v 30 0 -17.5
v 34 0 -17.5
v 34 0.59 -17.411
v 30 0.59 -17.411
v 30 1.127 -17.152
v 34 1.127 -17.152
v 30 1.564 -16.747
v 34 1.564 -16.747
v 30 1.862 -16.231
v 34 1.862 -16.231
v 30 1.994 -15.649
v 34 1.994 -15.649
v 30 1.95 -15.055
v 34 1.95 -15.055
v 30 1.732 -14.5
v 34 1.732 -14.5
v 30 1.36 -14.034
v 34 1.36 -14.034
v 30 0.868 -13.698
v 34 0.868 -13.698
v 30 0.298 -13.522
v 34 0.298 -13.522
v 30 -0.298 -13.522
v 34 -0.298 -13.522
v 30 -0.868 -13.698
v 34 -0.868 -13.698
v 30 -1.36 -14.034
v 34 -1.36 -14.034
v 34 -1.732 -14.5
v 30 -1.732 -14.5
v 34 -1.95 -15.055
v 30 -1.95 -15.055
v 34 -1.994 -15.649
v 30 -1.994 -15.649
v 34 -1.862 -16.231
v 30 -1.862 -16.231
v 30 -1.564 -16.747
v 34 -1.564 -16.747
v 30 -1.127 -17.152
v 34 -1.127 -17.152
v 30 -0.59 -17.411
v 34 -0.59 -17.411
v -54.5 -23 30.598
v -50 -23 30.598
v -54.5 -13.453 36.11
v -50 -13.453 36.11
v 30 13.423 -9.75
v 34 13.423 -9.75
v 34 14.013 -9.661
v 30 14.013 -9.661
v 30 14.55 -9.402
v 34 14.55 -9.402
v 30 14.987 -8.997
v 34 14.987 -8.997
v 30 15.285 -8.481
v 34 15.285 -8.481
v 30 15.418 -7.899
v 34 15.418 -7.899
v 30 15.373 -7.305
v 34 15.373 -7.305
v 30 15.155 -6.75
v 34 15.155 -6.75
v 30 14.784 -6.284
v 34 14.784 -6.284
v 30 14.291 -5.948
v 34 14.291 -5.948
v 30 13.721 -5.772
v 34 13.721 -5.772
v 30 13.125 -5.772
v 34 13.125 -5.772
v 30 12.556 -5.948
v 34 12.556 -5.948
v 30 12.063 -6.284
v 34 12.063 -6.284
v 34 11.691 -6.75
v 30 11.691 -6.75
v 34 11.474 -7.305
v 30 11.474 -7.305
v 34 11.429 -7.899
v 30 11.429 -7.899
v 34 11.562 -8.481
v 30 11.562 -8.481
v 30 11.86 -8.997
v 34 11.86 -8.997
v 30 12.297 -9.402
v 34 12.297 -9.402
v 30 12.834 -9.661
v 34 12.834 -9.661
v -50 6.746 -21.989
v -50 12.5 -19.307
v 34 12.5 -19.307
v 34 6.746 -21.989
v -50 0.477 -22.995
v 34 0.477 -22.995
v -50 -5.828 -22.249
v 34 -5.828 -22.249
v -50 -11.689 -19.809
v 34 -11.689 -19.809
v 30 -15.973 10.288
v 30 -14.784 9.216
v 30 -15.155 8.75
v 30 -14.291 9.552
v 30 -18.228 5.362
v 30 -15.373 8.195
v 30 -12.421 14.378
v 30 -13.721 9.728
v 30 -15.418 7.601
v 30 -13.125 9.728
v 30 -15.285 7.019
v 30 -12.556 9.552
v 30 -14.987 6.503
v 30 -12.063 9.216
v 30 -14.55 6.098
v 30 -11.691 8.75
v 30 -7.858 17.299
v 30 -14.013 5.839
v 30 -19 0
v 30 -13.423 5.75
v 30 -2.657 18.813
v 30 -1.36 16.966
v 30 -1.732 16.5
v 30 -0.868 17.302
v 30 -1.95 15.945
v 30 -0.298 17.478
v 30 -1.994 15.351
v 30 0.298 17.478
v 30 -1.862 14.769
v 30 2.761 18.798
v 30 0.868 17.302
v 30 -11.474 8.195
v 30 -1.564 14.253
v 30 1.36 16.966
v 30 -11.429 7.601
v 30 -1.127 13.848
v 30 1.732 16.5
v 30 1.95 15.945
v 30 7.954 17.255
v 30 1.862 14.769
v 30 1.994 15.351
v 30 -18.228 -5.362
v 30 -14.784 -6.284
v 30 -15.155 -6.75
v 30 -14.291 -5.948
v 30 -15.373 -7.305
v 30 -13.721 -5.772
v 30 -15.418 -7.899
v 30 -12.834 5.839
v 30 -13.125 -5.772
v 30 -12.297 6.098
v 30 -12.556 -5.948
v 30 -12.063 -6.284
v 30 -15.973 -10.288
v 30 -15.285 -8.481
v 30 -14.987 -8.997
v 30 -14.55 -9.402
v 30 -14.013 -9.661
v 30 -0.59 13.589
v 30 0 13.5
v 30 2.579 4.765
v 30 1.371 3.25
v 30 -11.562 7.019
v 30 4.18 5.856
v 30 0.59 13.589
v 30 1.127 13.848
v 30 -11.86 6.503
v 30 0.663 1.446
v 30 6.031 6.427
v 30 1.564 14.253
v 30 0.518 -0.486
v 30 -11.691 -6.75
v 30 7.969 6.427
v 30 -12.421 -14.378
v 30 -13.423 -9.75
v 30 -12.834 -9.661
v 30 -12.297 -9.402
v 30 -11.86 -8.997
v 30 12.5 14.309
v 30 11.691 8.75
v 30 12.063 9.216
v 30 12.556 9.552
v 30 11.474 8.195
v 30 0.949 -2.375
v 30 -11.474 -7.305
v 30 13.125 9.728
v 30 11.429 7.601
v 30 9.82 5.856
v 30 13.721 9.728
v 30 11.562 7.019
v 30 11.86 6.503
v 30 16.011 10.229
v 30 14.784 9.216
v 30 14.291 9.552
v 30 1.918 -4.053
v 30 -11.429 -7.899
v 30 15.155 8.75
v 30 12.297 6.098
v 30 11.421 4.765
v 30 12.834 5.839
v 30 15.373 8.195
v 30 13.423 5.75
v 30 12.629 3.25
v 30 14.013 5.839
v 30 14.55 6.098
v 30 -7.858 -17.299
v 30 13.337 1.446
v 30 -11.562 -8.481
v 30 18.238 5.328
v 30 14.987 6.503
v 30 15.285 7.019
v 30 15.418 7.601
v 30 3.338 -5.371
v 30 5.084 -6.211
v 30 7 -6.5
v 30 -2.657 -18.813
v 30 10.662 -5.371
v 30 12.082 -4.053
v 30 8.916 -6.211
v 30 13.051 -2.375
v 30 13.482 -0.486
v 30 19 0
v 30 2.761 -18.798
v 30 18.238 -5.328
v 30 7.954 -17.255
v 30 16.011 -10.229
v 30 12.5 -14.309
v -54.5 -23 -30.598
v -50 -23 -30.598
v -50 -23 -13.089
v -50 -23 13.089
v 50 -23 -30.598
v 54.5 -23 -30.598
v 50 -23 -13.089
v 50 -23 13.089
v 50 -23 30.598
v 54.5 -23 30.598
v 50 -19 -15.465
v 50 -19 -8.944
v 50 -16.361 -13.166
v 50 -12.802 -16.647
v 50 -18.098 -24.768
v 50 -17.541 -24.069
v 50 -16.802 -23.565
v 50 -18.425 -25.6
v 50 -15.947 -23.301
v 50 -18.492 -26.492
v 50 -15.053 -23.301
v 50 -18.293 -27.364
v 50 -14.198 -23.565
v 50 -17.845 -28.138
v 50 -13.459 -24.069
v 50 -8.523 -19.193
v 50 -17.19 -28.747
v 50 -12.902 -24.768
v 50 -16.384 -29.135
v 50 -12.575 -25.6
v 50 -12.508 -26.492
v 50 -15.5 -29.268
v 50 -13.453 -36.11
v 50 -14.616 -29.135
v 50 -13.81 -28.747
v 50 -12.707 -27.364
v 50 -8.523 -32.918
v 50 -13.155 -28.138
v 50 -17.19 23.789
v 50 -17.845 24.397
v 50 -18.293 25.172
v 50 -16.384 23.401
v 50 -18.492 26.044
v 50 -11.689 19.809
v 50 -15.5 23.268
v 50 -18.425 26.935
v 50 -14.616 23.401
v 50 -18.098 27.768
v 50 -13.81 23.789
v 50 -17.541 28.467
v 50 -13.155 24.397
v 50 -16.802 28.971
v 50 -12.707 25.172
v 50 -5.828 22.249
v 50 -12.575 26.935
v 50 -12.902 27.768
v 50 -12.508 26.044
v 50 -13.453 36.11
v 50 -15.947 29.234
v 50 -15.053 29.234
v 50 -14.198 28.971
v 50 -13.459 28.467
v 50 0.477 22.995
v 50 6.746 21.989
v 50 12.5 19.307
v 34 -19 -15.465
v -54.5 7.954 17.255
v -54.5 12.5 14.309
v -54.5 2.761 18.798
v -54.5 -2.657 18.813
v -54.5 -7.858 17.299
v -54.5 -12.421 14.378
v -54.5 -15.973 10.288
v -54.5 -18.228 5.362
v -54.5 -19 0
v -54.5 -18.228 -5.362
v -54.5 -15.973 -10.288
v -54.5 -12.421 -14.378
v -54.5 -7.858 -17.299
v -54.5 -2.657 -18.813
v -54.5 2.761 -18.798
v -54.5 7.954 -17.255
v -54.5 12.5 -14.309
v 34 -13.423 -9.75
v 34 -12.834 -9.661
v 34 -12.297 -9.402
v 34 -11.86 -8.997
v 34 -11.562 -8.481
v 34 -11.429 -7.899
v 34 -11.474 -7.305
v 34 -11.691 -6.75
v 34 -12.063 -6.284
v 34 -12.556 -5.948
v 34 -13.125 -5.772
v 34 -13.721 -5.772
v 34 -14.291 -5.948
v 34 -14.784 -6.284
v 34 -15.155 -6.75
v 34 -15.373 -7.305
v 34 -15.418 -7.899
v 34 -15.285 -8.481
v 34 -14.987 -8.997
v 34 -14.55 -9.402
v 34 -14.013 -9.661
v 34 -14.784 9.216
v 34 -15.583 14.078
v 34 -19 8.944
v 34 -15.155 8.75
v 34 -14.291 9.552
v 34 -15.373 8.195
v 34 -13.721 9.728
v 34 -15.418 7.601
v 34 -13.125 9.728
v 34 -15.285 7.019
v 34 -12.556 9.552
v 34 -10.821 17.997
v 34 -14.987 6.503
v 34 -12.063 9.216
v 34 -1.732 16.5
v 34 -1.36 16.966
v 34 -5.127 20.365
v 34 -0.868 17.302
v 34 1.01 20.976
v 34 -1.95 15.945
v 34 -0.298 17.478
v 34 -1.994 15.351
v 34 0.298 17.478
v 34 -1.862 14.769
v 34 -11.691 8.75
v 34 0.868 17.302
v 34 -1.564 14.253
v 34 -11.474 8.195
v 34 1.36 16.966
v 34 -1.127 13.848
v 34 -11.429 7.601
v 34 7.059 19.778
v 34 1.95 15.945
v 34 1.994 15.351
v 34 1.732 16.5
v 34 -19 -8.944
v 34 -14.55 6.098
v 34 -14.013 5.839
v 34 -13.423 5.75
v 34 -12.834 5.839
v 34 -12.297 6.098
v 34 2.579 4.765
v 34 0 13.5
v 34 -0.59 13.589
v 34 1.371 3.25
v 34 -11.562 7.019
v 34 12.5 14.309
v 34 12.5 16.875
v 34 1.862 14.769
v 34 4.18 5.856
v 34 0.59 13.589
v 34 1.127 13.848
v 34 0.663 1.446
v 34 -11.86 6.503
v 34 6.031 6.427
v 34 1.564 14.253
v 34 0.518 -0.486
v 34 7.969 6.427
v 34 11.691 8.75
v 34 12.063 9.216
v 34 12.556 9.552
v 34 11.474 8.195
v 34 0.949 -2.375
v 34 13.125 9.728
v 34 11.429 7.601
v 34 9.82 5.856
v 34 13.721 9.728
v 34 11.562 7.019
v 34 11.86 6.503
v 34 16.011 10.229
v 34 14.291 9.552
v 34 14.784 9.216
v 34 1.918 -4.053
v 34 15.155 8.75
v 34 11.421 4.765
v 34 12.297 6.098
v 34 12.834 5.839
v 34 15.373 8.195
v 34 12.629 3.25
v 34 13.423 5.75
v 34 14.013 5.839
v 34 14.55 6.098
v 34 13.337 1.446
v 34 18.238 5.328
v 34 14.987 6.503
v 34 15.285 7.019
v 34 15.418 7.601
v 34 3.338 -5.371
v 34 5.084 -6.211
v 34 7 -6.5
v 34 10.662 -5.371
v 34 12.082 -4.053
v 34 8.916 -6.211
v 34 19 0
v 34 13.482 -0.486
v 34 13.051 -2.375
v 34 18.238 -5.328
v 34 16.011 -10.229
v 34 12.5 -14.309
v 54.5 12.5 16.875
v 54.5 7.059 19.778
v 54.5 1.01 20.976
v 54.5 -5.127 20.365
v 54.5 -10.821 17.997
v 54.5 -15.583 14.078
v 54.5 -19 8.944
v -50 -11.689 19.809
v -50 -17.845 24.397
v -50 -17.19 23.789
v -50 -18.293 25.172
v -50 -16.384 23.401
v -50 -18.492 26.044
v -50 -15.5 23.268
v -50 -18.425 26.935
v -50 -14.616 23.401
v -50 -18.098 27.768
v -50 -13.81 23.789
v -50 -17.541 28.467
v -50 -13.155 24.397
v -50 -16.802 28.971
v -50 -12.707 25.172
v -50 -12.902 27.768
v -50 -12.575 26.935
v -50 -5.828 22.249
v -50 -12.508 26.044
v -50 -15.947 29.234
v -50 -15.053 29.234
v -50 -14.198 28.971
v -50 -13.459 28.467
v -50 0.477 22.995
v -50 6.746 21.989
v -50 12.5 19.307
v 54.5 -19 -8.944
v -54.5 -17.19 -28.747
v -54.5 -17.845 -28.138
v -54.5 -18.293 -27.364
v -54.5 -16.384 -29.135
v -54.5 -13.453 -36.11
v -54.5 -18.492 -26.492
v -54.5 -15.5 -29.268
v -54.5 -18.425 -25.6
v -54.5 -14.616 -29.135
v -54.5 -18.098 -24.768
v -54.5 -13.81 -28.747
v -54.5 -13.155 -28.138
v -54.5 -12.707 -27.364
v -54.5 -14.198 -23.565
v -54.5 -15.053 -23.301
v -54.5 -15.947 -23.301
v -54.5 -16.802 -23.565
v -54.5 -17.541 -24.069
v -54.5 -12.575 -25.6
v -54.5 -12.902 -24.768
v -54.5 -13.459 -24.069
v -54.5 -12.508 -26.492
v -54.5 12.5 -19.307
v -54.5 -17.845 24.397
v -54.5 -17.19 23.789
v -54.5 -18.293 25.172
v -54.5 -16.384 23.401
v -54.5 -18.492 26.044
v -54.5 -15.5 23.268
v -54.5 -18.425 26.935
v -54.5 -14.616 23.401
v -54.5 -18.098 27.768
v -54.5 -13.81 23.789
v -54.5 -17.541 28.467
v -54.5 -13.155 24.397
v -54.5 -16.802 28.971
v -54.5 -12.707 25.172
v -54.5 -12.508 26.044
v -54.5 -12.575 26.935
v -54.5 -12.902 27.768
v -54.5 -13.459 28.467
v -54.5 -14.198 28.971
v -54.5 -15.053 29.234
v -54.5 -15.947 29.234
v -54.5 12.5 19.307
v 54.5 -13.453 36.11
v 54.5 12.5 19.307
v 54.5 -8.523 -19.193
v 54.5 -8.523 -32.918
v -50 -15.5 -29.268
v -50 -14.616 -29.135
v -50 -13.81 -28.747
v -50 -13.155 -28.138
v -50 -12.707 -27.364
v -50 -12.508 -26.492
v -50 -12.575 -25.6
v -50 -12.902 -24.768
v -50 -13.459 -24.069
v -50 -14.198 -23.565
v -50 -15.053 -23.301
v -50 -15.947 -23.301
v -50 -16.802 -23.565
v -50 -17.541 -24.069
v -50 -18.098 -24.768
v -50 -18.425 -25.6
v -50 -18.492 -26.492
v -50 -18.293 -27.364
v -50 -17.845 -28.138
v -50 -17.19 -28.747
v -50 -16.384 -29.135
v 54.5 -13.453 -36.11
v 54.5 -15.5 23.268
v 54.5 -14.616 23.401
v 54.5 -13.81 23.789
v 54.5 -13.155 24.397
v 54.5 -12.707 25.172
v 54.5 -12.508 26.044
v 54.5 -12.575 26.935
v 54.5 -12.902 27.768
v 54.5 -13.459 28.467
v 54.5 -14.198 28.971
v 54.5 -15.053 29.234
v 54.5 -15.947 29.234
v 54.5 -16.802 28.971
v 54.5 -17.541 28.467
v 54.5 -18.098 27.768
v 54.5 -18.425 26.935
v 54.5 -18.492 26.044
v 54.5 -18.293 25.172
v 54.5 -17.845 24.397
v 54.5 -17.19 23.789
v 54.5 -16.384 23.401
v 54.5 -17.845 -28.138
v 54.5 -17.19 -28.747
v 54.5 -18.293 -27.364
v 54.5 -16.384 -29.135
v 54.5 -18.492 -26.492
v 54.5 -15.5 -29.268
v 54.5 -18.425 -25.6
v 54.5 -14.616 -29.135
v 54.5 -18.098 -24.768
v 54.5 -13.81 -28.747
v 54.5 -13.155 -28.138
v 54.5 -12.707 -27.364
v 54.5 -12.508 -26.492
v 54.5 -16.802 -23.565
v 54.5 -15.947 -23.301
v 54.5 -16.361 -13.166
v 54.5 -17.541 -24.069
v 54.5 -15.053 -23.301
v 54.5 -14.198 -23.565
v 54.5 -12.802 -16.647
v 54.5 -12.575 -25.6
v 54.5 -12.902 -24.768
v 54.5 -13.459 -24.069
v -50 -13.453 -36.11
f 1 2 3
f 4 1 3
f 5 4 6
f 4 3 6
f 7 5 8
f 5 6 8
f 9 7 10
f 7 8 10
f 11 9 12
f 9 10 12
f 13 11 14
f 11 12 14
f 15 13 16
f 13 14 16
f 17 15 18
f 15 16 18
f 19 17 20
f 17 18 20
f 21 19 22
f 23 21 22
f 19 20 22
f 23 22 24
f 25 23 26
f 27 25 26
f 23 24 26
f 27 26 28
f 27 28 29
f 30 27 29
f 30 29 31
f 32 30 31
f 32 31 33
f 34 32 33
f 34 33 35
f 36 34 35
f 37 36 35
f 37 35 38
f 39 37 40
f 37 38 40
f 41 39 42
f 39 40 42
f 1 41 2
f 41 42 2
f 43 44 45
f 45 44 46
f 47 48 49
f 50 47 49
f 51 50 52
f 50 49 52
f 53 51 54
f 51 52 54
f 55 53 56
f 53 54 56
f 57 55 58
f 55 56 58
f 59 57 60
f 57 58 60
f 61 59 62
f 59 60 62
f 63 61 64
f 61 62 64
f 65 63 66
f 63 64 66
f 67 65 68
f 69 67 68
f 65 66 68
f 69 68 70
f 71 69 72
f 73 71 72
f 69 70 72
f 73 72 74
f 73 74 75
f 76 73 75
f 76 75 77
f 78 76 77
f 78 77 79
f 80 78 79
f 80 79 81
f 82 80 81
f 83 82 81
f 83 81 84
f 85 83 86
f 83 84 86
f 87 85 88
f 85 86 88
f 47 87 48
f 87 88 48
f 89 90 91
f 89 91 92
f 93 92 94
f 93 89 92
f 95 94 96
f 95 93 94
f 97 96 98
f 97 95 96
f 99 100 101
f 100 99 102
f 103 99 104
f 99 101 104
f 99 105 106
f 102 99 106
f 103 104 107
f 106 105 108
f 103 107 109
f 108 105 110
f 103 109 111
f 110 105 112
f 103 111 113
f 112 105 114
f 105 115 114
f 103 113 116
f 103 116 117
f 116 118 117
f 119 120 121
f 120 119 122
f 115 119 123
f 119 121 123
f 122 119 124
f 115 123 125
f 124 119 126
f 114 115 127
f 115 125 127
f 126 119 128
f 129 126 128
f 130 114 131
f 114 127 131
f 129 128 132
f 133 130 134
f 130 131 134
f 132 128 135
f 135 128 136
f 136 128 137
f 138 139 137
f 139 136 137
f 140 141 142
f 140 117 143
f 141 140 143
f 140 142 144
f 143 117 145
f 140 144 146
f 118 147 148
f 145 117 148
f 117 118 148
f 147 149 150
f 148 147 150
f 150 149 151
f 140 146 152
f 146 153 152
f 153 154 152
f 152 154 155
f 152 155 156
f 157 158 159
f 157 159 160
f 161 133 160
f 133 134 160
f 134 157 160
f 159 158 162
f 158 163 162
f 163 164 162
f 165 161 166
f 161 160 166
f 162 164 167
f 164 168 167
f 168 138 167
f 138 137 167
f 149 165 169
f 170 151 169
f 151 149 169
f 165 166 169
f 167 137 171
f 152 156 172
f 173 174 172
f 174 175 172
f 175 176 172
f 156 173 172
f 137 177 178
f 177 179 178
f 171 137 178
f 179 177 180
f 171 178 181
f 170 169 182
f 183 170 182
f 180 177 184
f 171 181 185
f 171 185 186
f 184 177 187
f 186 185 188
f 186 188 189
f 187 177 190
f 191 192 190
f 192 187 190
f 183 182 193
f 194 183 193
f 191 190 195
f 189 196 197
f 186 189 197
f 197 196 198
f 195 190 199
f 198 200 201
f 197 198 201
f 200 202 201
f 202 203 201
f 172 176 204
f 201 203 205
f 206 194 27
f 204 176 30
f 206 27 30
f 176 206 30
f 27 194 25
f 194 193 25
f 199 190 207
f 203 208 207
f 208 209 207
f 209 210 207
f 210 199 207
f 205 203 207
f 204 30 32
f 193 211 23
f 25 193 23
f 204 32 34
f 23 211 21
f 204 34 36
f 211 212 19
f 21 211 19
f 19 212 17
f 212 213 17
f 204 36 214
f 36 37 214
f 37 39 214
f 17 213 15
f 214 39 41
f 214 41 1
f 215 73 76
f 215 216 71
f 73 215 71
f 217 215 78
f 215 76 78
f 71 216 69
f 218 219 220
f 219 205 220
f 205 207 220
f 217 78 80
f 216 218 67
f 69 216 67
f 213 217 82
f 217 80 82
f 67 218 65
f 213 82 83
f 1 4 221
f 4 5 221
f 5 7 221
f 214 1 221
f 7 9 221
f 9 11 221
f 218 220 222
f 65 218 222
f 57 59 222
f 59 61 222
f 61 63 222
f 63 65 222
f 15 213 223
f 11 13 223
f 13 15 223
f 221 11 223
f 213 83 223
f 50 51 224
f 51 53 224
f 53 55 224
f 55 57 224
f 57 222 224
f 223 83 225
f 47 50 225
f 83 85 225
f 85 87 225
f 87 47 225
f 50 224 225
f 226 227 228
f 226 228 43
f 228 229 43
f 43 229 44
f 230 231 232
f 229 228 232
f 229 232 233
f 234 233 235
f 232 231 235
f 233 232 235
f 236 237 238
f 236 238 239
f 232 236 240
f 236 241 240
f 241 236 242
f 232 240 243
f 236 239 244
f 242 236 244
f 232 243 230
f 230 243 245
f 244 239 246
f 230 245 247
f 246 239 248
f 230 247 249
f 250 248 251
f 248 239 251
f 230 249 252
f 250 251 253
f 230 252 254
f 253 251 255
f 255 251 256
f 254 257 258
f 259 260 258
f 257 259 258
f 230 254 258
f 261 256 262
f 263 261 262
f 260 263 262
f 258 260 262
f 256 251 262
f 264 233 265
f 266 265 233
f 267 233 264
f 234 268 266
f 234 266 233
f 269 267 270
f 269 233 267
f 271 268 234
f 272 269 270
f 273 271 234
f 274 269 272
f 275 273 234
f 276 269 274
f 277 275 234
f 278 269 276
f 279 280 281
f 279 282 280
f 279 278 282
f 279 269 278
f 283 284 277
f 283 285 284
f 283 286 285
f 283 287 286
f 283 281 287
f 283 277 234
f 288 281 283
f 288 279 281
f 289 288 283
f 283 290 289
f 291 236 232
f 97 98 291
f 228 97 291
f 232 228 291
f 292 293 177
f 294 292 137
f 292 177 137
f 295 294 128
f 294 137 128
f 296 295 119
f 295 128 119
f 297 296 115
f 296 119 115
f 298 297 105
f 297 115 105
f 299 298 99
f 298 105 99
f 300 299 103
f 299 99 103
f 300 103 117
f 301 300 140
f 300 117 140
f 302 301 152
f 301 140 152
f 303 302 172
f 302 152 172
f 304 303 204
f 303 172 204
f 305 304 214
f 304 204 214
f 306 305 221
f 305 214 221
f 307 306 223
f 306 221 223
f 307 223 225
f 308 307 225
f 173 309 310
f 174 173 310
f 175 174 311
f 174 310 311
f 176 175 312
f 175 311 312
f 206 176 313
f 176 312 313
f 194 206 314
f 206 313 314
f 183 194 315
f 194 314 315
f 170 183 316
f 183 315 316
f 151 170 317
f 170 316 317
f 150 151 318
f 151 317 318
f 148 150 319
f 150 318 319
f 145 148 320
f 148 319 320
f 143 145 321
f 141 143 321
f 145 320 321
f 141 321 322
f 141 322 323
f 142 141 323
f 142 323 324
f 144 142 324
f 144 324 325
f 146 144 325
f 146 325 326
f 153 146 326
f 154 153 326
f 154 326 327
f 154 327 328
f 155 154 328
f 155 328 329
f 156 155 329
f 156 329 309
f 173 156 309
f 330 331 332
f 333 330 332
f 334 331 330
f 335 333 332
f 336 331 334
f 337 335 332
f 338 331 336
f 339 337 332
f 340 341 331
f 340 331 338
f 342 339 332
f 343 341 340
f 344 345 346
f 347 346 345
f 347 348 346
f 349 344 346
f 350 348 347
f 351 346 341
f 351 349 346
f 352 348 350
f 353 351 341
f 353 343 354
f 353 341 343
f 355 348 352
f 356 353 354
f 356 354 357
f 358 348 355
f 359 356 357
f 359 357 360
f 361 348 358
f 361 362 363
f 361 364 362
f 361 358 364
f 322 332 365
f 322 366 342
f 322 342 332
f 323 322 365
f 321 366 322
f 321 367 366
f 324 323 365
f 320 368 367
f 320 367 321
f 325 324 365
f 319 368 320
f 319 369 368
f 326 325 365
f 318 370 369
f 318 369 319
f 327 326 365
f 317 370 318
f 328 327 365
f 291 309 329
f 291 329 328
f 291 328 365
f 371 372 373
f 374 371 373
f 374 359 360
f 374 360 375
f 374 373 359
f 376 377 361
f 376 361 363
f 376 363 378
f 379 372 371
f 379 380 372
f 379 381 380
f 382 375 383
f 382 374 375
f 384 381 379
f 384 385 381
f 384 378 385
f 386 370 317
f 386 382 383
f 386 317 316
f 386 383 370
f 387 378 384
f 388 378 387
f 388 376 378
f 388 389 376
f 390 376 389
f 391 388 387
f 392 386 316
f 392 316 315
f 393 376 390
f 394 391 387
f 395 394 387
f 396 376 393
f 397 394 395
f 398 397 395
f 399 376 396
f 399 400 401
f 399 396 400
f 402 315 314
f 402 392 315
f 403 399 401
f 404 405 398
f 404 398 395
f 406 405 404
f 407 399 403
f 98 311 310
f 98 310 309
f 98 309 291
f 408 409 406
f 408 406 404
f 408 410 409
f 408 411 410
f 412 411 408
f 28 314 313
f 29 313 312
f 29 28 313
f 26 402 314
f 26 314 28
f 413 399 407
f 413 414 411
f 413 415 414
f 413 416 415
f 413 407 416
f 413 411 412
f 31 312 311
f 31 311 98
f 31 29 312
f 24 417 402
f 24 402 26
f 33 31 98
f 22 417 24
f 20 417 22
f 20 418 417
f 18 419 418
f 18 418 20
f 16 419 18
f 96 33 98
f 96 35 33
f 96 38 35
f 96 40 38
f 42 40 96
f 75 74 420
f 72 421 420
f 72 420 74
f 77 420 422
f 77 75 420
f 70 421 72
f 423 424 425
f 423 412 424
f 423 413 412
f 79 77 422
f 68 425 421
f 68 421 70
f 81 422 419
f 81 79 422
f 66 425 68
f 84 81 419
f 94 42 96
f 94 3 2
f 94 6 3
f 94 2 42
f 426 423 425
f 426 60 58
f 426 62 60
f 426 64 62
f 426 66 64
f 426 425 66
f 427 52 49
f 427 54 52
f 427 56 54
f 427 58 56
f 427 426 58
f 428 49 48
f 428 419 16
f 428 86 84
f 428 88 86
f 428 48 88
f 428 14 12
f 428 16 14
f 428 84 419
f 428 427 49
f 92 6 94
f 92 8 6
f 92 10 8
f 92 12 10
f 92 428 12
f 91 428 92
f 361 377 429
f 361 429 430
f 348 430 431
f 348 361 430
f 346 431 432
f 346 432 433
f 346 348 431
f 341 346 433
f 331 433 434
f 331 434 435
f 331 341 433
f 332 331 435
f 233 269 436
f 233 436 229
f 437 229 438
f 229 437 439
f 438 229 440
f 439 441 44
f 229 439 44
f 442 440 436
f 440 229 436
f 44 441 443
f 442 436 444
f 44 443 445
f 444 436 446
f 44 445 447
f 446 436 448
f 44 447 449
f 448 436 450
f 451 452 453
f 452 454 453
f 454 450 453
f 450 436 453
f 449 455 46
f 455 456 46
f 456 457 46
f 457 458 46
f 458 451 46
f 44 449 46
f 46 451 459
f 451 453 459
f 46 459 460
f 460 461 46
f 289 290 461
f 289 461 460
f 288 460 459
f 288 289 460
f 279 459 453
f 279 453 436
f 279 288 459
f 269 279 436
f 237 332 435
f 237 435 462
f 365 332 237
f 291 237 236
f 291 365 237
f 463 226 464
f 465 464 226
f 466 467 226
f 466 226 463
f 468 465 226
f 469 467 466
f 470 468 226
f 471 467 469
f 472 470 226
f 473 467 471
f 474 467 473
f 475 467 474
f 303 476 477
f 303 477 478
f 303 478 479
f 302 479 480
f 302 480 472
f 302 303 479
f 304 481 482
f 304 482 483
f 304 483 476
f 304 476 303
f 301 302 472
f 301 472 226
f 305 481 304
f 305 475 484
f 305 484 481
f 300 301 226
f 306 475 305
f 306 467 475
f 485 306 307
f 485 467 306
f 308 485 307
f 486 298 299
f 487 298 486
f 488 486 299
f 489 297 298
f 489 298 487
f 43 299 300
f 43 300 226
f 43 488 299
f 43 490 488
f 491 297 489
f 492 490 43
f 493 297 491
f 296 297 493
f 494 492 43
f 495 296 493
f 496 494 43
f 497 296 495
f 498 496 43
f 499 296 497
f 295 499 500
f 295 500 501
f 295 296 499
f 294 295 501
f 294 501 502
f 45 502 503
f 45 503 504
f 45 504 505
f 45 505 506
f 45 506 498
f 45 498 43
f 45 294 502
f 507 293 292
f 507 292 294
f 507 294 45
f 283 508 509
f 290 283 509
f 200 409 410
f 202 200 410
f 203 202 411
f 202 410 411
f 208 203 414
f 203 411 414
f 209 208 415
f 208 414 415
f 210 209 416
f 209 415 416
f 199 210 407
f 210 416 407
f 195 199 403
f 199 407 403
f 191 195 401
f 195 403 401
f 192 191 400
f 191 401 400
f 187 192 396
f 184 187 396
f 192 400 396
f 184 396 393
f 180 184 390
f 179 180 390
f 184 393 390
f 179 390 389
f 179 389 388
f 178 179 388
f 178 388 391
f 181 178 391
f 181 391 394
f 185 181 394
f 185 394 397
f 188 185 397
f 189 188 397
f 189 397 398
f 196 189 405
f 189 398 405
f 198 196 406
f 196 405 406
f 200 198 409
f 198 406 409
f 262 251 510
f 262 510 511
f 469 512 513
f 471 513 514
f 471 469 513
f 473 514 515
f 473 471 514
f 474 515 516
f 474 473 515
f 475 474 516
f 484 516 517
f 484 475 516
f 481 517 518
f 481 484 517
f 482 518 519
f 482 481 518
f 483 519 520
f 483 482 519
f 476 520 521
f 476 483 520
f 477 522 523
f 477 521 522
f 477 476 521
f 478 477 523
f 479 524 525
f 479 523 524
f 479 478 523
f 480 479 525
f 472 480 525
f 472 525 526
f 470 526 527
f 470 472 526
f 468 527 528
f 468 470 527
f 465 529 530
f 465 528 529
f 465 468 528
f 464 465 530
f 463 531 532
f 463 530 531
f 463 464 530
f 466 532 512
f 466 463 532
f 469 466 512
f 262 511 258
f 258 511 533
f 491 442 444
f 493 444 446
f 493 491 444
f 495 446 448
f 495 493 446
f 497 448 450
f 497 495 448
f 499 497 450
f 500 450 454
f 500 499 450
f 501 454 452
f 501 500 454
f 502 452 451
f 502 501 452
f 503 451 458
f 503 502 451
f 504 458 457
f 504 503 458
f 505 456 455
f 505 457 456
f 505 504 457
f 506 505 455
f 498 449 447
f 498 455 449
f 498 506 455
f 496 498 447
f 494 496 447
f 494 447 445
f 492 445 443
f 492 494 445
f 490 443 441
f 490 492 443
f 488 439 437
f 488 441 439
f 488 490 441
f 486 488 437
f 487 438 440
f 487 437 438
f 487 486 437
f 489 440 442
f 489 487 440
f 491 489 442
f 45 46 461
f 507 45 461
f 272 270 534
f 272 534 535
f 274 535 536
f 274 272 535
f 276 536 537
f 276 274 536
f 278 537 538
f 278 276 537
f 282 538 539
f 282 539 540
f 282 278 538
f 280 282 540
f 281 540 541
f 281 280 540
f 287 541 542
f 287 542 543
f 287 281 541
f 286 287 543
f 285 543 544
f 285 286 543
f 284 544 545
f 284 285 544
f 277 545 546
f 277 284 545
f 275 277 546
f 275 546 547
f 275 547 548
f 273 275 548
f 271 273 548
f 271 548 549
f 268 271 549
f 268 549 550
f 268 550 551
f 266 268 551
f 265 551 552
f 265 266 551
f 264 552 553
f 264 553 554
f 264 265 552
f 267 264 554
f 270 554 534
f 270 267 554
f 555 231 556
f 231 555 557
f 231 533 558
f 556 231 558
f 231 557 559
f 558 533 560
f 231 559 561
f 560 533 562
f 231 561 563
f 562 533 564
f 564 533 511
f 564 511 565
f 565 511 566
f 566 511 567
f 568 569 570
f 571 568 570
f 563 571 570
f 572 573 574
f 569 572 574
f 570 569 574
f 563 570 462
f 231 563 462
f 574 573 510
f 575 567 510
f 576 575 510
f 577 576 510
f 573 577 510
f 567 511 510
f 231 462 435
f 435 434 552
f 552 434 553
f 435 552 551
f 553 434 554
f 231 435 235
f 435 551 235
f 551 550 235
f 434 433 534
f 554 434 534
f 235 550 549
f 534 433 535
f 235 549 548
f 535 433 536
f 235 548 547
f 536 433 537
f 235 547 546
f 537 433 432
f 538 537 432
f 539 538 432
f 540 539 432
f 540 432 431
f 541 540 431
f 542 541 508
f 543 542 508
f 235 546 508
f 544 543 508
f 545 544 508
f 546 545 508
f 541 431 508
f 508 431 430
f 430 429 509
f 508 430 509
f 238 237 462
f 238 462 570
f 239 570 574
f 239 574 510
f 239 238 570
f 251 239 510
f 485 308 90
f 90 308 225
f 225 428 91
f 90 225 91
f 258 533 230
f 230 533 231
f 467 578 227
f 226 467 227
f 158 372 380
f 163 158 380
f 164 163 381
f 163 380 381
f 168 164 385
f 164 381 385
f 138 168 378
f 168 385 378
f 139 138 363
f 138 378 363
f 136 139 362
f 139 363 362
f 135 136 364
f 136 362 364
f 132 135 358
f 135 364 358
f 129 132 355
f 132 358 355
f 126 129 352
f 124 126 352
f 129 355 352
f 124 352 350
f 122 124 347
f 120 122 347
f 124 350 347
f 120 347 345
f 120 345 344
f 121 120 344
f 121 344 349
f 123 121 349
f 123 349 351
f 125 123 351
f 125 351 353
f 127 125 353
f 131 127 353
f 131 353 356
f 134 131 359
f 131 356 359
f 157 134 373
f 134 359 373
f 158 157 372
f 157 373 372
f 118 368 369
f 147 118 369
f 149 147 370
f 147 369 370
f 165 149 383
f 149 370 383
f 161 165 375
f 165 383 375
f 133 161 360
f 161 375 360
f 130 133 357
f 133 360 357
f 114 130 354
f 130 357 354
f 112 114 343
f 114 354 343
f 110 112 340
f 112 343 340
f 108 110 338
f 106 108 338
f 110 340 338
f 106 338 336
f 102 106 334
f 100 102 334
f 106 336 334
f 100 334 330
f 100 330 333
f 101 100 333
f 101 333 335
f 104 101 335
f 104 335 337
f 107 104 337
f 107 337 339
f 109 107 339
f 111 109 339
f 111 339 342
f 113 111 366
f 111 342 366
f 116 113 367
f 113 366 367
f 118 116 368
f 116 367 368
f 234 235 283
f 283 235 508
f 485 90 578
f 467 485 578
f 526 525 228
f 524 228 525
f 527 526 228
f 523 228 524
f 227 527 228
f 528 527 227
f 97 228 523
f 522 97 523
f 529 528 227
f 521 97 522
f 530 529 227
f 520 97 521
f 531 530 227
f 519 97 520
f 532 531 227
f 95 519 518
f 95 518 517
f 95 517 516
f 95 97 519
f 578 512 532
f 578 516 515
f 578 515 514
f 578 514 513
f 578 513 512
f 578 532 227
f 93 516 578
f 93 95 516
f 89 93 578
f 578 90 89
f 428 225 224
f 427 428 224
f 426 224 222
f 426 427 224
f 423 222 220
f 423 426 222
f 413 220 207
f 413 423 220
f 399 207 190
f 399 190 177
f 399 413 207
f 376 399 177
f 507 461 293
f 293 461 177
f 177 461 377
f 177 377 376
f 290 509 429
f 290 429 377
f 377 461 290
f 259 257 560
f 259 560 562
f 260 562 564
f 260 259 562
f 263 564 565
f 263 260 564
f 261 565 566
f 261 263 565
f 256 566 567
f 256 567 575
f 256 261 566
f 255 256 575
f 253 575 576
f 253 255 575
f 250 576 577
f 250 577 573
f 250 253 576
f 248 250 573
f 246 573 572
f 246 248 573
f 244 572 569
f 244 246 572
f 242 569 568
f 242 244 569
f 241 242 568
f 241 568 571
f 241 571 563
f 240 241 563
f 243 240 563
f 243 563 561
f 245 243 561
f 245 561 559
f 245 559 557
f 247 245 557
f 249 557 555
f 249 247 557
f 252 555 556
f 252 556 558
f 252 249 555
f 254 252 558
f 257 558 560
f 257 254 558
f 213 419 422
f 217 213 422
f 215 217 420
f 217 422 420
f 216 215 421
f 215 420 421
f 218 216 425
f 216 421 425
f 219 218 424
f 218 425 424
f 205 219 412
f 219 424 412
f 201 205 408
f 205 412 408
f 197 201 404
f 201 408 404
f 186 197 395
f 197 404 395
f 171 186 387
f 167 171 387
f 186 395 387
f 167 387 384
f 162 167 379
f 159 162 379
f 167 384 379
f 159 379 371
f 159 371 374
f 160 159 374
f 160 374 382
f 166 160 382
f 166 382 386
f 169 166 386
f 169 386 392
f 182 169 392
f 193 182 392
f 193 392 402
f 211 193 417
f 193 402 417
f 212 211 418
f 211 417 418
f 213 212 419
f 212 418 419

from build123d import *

# Parameters (mm, degrees)
SKETCH1_R           = 3
BOSS_EXTRUDE1_DEPTH = 54.5
CUT_EXTRUDE1_DEPTH  = 50
BOSS_EXTRUDE2_START = 34
SKETCH3_R           = 19
SKETCH3_R_2         = 6.5
SKETCH3_R_3         = 2
BOSS_EXTRUDE2_DEPTH = 4
CUT_EXTRUDE2_DEPTH  = 20.5
SKETCH5_W           = 31.652494028
SKETCH5_H           = 22.199486155
CUT_EXTRUDE3_DEPTH  = 16


# Read off the part's stored shape, not the designer's step: Cut-Extrude2
with BuildPart() as part:
    # Sketch1 → Boss-Extrude1 (new, symmetric)
    with BuildSketch(Plane(origin=(0, 0, 0), x_dir=(0, 0, -1), z_dir=(1, 0, 0))):
        with BuildLine():
            Line((26.267851073, -23), (0, -23))
            Line((0, -23), (-26.267851073, -23))
            Line((-26.267851073, -23), (-30.597978092, -23))
            Line((-30.597978092, -23), (-36.109878886, -13.453107779))
            Line((-36.109878886, -13.453107779), (-19.306734576, 12.5))
            Line((-19.306734576, 12.5), (-14.309088021, 12.5))
            ThreePointArc((-14.309088021, 12.5), (0, -19), (14.309088021, 12.5))
            Line((14.309088021, 12.5), (19.306734576, 12.5))
            Line((19.306734576, 12.5), (36.109878886, -13.453107779))
            Line((36.109878886, -13.453107779), (30.597978092, -23))
            Line((30.597978092, -23), (26.267851073, -23))
        make_face()
        with Locations((26.267851073, -15.5)):
            Circle(SKETCH1_R, mode=Mode.SUBTRACT)
        with Locations((-26.267851073, -15.5)):
            Circle(SKETCH1_R, mode=Mode.SUBTRACT)
    extrude(amount=BOSS_EXTRUDE1_DEPTH, both=True)

    # Sketch2 → Cut-Extrude1 (cut, symmetric)
    with BuildSketch(Plane(origin=(0, 0, 0), x_dir=(0, 0, -1), z_dir=(1, 0, 0))):
        with BuildLine():
            Line((19.808543432, -11.68852459), (13.089377665, -23))
            Line((13.089377665, -23), (30.597978092, -23))
            Line((30.597978092, -23), (36.109878886, -13.453107779))
            Line((36.109878886, -13.453107779), (19.306734576, 12.5))
            ThreePointArc((19.306734576, 12.5), (22.995052161, 0.477049386), (19.808543432, -11.68852459))
        make_face()
        with BuildLine():
            Line((-19.808543432, -11.68852459), (-13.089377665, -23))
            Line((-13.089377665, -23), (-30.597978092, -23))
            Line((-30.597978092, -23), (-36.109878886, -13.453107779))
            Line((-36.109878886, -13.453107779), (-19.306734576, 12.5))
            ThreePointArc((-19.306734576, 12.5), (-22.995052161, 0.477049386), (-19.808543432, -11.68852459))
        make_face()
    extrude(amount=CUT_EXTRUDE1_DEPTH, both=True, mode=Mode.SUBTRACT)

    # Sketch3 → Boss-Extrude2 (add)
    with BuildSketch(Plane(origin=(0, 0, 0), x_dir=(0, 0, -1), z_dir=(1, 0, 0)).offset(BOSS_EXTRUDE2_START)):
        Circle(SKETCH3_R)
        with Locations((0, 7)):
            Circle(SKETCH3_R_2, mode=Mode.SUBTRACT)
        with Locations((15.5, 0)):
            Circle(SKETCH3_R_3, mode=Mode.SUBTRACT)
        with Locations((7.75, -13.423393759)):
            Circle(SKETCH3_R_3, mode=Mode.SUBTRACT)
        with Locations((-7.75, -13.423393759)):
            Circle(SKETCH3_R_3, mode=Mode.SUBTRACT)
        with Locations((-15.5, 0)):
            Circle(SKETCH3_R_3, mode=Mode.SUBTRACT)
        with Locations((-7.75, 13.423393759)):
            Circle(SKETCH3_R_3, mode=Mode.SUBTRACT)
        with Locations((7.75, 13.423393759)):
            Circle(SKETCH3_R_3, mode=Mode.SUBTRACT)
    extrude(amount=-BOSS_EXTRUDE2_DEPTH)

    # Cut-Extrude2 outline → Cut-Extrude2 (cut)
    with BuildSketch(Plane(origin=(34, 0, 0), x_dir=(0, 0, -1), z_dir=(1, 0, 0))):
        with BuildLine():
            ThreePointArc((14.309088021, 12.5), (17.298843892, -7.858116823), (0, -19))
            Line((0, -19), (8.94427191, -19))
            ThreePointArc((8.94427191, -19), (15.012010115, -14.684670657), (19.192540727, -8.523284605))
            Line((19.192540727, -8.523284605), (32.918101974, -8.523284605))
            Line((32.918101974, -8.523284605), (19.306734576, 12.5))
            Line((19.306734576, 12.5), (14.309088021, 12.5))
        make_face()
        with BuildLine():
            ThreePointArc((-16.874537031, 12.5), (-20.364558031, -5.126868071), (-8.94427191, -19))
            Line((-8.94427191, -19), (0, -19))
            ThreePointArc((0, -19), (-17.298843892, -7.858116823), (-14.309088021, 12.5))
            Line((-14.309088021, 12.5), (-16.874537031, 12.5))
        make_face()
    extrude(amount=CUT_EXTRUDE2_DEPTH, mode=Mode.SUBTRACT)

    # Sketch5 → Cut-Extrude3 (cut)
    with BuildSketch(Plane(origin=(34, 0, 0), x_dir=(0, 0, -1), z_dir=(1, 0, 0))):
        with Locations((24.770518924, -7.900256922)):
            Rectangle(SKETCH5_W, SKETCH5_H)
    extrude(amount=CUT_EXTRUDE3_DEPTH, mode=Mode.SUBTRACT)


solid = part.part
